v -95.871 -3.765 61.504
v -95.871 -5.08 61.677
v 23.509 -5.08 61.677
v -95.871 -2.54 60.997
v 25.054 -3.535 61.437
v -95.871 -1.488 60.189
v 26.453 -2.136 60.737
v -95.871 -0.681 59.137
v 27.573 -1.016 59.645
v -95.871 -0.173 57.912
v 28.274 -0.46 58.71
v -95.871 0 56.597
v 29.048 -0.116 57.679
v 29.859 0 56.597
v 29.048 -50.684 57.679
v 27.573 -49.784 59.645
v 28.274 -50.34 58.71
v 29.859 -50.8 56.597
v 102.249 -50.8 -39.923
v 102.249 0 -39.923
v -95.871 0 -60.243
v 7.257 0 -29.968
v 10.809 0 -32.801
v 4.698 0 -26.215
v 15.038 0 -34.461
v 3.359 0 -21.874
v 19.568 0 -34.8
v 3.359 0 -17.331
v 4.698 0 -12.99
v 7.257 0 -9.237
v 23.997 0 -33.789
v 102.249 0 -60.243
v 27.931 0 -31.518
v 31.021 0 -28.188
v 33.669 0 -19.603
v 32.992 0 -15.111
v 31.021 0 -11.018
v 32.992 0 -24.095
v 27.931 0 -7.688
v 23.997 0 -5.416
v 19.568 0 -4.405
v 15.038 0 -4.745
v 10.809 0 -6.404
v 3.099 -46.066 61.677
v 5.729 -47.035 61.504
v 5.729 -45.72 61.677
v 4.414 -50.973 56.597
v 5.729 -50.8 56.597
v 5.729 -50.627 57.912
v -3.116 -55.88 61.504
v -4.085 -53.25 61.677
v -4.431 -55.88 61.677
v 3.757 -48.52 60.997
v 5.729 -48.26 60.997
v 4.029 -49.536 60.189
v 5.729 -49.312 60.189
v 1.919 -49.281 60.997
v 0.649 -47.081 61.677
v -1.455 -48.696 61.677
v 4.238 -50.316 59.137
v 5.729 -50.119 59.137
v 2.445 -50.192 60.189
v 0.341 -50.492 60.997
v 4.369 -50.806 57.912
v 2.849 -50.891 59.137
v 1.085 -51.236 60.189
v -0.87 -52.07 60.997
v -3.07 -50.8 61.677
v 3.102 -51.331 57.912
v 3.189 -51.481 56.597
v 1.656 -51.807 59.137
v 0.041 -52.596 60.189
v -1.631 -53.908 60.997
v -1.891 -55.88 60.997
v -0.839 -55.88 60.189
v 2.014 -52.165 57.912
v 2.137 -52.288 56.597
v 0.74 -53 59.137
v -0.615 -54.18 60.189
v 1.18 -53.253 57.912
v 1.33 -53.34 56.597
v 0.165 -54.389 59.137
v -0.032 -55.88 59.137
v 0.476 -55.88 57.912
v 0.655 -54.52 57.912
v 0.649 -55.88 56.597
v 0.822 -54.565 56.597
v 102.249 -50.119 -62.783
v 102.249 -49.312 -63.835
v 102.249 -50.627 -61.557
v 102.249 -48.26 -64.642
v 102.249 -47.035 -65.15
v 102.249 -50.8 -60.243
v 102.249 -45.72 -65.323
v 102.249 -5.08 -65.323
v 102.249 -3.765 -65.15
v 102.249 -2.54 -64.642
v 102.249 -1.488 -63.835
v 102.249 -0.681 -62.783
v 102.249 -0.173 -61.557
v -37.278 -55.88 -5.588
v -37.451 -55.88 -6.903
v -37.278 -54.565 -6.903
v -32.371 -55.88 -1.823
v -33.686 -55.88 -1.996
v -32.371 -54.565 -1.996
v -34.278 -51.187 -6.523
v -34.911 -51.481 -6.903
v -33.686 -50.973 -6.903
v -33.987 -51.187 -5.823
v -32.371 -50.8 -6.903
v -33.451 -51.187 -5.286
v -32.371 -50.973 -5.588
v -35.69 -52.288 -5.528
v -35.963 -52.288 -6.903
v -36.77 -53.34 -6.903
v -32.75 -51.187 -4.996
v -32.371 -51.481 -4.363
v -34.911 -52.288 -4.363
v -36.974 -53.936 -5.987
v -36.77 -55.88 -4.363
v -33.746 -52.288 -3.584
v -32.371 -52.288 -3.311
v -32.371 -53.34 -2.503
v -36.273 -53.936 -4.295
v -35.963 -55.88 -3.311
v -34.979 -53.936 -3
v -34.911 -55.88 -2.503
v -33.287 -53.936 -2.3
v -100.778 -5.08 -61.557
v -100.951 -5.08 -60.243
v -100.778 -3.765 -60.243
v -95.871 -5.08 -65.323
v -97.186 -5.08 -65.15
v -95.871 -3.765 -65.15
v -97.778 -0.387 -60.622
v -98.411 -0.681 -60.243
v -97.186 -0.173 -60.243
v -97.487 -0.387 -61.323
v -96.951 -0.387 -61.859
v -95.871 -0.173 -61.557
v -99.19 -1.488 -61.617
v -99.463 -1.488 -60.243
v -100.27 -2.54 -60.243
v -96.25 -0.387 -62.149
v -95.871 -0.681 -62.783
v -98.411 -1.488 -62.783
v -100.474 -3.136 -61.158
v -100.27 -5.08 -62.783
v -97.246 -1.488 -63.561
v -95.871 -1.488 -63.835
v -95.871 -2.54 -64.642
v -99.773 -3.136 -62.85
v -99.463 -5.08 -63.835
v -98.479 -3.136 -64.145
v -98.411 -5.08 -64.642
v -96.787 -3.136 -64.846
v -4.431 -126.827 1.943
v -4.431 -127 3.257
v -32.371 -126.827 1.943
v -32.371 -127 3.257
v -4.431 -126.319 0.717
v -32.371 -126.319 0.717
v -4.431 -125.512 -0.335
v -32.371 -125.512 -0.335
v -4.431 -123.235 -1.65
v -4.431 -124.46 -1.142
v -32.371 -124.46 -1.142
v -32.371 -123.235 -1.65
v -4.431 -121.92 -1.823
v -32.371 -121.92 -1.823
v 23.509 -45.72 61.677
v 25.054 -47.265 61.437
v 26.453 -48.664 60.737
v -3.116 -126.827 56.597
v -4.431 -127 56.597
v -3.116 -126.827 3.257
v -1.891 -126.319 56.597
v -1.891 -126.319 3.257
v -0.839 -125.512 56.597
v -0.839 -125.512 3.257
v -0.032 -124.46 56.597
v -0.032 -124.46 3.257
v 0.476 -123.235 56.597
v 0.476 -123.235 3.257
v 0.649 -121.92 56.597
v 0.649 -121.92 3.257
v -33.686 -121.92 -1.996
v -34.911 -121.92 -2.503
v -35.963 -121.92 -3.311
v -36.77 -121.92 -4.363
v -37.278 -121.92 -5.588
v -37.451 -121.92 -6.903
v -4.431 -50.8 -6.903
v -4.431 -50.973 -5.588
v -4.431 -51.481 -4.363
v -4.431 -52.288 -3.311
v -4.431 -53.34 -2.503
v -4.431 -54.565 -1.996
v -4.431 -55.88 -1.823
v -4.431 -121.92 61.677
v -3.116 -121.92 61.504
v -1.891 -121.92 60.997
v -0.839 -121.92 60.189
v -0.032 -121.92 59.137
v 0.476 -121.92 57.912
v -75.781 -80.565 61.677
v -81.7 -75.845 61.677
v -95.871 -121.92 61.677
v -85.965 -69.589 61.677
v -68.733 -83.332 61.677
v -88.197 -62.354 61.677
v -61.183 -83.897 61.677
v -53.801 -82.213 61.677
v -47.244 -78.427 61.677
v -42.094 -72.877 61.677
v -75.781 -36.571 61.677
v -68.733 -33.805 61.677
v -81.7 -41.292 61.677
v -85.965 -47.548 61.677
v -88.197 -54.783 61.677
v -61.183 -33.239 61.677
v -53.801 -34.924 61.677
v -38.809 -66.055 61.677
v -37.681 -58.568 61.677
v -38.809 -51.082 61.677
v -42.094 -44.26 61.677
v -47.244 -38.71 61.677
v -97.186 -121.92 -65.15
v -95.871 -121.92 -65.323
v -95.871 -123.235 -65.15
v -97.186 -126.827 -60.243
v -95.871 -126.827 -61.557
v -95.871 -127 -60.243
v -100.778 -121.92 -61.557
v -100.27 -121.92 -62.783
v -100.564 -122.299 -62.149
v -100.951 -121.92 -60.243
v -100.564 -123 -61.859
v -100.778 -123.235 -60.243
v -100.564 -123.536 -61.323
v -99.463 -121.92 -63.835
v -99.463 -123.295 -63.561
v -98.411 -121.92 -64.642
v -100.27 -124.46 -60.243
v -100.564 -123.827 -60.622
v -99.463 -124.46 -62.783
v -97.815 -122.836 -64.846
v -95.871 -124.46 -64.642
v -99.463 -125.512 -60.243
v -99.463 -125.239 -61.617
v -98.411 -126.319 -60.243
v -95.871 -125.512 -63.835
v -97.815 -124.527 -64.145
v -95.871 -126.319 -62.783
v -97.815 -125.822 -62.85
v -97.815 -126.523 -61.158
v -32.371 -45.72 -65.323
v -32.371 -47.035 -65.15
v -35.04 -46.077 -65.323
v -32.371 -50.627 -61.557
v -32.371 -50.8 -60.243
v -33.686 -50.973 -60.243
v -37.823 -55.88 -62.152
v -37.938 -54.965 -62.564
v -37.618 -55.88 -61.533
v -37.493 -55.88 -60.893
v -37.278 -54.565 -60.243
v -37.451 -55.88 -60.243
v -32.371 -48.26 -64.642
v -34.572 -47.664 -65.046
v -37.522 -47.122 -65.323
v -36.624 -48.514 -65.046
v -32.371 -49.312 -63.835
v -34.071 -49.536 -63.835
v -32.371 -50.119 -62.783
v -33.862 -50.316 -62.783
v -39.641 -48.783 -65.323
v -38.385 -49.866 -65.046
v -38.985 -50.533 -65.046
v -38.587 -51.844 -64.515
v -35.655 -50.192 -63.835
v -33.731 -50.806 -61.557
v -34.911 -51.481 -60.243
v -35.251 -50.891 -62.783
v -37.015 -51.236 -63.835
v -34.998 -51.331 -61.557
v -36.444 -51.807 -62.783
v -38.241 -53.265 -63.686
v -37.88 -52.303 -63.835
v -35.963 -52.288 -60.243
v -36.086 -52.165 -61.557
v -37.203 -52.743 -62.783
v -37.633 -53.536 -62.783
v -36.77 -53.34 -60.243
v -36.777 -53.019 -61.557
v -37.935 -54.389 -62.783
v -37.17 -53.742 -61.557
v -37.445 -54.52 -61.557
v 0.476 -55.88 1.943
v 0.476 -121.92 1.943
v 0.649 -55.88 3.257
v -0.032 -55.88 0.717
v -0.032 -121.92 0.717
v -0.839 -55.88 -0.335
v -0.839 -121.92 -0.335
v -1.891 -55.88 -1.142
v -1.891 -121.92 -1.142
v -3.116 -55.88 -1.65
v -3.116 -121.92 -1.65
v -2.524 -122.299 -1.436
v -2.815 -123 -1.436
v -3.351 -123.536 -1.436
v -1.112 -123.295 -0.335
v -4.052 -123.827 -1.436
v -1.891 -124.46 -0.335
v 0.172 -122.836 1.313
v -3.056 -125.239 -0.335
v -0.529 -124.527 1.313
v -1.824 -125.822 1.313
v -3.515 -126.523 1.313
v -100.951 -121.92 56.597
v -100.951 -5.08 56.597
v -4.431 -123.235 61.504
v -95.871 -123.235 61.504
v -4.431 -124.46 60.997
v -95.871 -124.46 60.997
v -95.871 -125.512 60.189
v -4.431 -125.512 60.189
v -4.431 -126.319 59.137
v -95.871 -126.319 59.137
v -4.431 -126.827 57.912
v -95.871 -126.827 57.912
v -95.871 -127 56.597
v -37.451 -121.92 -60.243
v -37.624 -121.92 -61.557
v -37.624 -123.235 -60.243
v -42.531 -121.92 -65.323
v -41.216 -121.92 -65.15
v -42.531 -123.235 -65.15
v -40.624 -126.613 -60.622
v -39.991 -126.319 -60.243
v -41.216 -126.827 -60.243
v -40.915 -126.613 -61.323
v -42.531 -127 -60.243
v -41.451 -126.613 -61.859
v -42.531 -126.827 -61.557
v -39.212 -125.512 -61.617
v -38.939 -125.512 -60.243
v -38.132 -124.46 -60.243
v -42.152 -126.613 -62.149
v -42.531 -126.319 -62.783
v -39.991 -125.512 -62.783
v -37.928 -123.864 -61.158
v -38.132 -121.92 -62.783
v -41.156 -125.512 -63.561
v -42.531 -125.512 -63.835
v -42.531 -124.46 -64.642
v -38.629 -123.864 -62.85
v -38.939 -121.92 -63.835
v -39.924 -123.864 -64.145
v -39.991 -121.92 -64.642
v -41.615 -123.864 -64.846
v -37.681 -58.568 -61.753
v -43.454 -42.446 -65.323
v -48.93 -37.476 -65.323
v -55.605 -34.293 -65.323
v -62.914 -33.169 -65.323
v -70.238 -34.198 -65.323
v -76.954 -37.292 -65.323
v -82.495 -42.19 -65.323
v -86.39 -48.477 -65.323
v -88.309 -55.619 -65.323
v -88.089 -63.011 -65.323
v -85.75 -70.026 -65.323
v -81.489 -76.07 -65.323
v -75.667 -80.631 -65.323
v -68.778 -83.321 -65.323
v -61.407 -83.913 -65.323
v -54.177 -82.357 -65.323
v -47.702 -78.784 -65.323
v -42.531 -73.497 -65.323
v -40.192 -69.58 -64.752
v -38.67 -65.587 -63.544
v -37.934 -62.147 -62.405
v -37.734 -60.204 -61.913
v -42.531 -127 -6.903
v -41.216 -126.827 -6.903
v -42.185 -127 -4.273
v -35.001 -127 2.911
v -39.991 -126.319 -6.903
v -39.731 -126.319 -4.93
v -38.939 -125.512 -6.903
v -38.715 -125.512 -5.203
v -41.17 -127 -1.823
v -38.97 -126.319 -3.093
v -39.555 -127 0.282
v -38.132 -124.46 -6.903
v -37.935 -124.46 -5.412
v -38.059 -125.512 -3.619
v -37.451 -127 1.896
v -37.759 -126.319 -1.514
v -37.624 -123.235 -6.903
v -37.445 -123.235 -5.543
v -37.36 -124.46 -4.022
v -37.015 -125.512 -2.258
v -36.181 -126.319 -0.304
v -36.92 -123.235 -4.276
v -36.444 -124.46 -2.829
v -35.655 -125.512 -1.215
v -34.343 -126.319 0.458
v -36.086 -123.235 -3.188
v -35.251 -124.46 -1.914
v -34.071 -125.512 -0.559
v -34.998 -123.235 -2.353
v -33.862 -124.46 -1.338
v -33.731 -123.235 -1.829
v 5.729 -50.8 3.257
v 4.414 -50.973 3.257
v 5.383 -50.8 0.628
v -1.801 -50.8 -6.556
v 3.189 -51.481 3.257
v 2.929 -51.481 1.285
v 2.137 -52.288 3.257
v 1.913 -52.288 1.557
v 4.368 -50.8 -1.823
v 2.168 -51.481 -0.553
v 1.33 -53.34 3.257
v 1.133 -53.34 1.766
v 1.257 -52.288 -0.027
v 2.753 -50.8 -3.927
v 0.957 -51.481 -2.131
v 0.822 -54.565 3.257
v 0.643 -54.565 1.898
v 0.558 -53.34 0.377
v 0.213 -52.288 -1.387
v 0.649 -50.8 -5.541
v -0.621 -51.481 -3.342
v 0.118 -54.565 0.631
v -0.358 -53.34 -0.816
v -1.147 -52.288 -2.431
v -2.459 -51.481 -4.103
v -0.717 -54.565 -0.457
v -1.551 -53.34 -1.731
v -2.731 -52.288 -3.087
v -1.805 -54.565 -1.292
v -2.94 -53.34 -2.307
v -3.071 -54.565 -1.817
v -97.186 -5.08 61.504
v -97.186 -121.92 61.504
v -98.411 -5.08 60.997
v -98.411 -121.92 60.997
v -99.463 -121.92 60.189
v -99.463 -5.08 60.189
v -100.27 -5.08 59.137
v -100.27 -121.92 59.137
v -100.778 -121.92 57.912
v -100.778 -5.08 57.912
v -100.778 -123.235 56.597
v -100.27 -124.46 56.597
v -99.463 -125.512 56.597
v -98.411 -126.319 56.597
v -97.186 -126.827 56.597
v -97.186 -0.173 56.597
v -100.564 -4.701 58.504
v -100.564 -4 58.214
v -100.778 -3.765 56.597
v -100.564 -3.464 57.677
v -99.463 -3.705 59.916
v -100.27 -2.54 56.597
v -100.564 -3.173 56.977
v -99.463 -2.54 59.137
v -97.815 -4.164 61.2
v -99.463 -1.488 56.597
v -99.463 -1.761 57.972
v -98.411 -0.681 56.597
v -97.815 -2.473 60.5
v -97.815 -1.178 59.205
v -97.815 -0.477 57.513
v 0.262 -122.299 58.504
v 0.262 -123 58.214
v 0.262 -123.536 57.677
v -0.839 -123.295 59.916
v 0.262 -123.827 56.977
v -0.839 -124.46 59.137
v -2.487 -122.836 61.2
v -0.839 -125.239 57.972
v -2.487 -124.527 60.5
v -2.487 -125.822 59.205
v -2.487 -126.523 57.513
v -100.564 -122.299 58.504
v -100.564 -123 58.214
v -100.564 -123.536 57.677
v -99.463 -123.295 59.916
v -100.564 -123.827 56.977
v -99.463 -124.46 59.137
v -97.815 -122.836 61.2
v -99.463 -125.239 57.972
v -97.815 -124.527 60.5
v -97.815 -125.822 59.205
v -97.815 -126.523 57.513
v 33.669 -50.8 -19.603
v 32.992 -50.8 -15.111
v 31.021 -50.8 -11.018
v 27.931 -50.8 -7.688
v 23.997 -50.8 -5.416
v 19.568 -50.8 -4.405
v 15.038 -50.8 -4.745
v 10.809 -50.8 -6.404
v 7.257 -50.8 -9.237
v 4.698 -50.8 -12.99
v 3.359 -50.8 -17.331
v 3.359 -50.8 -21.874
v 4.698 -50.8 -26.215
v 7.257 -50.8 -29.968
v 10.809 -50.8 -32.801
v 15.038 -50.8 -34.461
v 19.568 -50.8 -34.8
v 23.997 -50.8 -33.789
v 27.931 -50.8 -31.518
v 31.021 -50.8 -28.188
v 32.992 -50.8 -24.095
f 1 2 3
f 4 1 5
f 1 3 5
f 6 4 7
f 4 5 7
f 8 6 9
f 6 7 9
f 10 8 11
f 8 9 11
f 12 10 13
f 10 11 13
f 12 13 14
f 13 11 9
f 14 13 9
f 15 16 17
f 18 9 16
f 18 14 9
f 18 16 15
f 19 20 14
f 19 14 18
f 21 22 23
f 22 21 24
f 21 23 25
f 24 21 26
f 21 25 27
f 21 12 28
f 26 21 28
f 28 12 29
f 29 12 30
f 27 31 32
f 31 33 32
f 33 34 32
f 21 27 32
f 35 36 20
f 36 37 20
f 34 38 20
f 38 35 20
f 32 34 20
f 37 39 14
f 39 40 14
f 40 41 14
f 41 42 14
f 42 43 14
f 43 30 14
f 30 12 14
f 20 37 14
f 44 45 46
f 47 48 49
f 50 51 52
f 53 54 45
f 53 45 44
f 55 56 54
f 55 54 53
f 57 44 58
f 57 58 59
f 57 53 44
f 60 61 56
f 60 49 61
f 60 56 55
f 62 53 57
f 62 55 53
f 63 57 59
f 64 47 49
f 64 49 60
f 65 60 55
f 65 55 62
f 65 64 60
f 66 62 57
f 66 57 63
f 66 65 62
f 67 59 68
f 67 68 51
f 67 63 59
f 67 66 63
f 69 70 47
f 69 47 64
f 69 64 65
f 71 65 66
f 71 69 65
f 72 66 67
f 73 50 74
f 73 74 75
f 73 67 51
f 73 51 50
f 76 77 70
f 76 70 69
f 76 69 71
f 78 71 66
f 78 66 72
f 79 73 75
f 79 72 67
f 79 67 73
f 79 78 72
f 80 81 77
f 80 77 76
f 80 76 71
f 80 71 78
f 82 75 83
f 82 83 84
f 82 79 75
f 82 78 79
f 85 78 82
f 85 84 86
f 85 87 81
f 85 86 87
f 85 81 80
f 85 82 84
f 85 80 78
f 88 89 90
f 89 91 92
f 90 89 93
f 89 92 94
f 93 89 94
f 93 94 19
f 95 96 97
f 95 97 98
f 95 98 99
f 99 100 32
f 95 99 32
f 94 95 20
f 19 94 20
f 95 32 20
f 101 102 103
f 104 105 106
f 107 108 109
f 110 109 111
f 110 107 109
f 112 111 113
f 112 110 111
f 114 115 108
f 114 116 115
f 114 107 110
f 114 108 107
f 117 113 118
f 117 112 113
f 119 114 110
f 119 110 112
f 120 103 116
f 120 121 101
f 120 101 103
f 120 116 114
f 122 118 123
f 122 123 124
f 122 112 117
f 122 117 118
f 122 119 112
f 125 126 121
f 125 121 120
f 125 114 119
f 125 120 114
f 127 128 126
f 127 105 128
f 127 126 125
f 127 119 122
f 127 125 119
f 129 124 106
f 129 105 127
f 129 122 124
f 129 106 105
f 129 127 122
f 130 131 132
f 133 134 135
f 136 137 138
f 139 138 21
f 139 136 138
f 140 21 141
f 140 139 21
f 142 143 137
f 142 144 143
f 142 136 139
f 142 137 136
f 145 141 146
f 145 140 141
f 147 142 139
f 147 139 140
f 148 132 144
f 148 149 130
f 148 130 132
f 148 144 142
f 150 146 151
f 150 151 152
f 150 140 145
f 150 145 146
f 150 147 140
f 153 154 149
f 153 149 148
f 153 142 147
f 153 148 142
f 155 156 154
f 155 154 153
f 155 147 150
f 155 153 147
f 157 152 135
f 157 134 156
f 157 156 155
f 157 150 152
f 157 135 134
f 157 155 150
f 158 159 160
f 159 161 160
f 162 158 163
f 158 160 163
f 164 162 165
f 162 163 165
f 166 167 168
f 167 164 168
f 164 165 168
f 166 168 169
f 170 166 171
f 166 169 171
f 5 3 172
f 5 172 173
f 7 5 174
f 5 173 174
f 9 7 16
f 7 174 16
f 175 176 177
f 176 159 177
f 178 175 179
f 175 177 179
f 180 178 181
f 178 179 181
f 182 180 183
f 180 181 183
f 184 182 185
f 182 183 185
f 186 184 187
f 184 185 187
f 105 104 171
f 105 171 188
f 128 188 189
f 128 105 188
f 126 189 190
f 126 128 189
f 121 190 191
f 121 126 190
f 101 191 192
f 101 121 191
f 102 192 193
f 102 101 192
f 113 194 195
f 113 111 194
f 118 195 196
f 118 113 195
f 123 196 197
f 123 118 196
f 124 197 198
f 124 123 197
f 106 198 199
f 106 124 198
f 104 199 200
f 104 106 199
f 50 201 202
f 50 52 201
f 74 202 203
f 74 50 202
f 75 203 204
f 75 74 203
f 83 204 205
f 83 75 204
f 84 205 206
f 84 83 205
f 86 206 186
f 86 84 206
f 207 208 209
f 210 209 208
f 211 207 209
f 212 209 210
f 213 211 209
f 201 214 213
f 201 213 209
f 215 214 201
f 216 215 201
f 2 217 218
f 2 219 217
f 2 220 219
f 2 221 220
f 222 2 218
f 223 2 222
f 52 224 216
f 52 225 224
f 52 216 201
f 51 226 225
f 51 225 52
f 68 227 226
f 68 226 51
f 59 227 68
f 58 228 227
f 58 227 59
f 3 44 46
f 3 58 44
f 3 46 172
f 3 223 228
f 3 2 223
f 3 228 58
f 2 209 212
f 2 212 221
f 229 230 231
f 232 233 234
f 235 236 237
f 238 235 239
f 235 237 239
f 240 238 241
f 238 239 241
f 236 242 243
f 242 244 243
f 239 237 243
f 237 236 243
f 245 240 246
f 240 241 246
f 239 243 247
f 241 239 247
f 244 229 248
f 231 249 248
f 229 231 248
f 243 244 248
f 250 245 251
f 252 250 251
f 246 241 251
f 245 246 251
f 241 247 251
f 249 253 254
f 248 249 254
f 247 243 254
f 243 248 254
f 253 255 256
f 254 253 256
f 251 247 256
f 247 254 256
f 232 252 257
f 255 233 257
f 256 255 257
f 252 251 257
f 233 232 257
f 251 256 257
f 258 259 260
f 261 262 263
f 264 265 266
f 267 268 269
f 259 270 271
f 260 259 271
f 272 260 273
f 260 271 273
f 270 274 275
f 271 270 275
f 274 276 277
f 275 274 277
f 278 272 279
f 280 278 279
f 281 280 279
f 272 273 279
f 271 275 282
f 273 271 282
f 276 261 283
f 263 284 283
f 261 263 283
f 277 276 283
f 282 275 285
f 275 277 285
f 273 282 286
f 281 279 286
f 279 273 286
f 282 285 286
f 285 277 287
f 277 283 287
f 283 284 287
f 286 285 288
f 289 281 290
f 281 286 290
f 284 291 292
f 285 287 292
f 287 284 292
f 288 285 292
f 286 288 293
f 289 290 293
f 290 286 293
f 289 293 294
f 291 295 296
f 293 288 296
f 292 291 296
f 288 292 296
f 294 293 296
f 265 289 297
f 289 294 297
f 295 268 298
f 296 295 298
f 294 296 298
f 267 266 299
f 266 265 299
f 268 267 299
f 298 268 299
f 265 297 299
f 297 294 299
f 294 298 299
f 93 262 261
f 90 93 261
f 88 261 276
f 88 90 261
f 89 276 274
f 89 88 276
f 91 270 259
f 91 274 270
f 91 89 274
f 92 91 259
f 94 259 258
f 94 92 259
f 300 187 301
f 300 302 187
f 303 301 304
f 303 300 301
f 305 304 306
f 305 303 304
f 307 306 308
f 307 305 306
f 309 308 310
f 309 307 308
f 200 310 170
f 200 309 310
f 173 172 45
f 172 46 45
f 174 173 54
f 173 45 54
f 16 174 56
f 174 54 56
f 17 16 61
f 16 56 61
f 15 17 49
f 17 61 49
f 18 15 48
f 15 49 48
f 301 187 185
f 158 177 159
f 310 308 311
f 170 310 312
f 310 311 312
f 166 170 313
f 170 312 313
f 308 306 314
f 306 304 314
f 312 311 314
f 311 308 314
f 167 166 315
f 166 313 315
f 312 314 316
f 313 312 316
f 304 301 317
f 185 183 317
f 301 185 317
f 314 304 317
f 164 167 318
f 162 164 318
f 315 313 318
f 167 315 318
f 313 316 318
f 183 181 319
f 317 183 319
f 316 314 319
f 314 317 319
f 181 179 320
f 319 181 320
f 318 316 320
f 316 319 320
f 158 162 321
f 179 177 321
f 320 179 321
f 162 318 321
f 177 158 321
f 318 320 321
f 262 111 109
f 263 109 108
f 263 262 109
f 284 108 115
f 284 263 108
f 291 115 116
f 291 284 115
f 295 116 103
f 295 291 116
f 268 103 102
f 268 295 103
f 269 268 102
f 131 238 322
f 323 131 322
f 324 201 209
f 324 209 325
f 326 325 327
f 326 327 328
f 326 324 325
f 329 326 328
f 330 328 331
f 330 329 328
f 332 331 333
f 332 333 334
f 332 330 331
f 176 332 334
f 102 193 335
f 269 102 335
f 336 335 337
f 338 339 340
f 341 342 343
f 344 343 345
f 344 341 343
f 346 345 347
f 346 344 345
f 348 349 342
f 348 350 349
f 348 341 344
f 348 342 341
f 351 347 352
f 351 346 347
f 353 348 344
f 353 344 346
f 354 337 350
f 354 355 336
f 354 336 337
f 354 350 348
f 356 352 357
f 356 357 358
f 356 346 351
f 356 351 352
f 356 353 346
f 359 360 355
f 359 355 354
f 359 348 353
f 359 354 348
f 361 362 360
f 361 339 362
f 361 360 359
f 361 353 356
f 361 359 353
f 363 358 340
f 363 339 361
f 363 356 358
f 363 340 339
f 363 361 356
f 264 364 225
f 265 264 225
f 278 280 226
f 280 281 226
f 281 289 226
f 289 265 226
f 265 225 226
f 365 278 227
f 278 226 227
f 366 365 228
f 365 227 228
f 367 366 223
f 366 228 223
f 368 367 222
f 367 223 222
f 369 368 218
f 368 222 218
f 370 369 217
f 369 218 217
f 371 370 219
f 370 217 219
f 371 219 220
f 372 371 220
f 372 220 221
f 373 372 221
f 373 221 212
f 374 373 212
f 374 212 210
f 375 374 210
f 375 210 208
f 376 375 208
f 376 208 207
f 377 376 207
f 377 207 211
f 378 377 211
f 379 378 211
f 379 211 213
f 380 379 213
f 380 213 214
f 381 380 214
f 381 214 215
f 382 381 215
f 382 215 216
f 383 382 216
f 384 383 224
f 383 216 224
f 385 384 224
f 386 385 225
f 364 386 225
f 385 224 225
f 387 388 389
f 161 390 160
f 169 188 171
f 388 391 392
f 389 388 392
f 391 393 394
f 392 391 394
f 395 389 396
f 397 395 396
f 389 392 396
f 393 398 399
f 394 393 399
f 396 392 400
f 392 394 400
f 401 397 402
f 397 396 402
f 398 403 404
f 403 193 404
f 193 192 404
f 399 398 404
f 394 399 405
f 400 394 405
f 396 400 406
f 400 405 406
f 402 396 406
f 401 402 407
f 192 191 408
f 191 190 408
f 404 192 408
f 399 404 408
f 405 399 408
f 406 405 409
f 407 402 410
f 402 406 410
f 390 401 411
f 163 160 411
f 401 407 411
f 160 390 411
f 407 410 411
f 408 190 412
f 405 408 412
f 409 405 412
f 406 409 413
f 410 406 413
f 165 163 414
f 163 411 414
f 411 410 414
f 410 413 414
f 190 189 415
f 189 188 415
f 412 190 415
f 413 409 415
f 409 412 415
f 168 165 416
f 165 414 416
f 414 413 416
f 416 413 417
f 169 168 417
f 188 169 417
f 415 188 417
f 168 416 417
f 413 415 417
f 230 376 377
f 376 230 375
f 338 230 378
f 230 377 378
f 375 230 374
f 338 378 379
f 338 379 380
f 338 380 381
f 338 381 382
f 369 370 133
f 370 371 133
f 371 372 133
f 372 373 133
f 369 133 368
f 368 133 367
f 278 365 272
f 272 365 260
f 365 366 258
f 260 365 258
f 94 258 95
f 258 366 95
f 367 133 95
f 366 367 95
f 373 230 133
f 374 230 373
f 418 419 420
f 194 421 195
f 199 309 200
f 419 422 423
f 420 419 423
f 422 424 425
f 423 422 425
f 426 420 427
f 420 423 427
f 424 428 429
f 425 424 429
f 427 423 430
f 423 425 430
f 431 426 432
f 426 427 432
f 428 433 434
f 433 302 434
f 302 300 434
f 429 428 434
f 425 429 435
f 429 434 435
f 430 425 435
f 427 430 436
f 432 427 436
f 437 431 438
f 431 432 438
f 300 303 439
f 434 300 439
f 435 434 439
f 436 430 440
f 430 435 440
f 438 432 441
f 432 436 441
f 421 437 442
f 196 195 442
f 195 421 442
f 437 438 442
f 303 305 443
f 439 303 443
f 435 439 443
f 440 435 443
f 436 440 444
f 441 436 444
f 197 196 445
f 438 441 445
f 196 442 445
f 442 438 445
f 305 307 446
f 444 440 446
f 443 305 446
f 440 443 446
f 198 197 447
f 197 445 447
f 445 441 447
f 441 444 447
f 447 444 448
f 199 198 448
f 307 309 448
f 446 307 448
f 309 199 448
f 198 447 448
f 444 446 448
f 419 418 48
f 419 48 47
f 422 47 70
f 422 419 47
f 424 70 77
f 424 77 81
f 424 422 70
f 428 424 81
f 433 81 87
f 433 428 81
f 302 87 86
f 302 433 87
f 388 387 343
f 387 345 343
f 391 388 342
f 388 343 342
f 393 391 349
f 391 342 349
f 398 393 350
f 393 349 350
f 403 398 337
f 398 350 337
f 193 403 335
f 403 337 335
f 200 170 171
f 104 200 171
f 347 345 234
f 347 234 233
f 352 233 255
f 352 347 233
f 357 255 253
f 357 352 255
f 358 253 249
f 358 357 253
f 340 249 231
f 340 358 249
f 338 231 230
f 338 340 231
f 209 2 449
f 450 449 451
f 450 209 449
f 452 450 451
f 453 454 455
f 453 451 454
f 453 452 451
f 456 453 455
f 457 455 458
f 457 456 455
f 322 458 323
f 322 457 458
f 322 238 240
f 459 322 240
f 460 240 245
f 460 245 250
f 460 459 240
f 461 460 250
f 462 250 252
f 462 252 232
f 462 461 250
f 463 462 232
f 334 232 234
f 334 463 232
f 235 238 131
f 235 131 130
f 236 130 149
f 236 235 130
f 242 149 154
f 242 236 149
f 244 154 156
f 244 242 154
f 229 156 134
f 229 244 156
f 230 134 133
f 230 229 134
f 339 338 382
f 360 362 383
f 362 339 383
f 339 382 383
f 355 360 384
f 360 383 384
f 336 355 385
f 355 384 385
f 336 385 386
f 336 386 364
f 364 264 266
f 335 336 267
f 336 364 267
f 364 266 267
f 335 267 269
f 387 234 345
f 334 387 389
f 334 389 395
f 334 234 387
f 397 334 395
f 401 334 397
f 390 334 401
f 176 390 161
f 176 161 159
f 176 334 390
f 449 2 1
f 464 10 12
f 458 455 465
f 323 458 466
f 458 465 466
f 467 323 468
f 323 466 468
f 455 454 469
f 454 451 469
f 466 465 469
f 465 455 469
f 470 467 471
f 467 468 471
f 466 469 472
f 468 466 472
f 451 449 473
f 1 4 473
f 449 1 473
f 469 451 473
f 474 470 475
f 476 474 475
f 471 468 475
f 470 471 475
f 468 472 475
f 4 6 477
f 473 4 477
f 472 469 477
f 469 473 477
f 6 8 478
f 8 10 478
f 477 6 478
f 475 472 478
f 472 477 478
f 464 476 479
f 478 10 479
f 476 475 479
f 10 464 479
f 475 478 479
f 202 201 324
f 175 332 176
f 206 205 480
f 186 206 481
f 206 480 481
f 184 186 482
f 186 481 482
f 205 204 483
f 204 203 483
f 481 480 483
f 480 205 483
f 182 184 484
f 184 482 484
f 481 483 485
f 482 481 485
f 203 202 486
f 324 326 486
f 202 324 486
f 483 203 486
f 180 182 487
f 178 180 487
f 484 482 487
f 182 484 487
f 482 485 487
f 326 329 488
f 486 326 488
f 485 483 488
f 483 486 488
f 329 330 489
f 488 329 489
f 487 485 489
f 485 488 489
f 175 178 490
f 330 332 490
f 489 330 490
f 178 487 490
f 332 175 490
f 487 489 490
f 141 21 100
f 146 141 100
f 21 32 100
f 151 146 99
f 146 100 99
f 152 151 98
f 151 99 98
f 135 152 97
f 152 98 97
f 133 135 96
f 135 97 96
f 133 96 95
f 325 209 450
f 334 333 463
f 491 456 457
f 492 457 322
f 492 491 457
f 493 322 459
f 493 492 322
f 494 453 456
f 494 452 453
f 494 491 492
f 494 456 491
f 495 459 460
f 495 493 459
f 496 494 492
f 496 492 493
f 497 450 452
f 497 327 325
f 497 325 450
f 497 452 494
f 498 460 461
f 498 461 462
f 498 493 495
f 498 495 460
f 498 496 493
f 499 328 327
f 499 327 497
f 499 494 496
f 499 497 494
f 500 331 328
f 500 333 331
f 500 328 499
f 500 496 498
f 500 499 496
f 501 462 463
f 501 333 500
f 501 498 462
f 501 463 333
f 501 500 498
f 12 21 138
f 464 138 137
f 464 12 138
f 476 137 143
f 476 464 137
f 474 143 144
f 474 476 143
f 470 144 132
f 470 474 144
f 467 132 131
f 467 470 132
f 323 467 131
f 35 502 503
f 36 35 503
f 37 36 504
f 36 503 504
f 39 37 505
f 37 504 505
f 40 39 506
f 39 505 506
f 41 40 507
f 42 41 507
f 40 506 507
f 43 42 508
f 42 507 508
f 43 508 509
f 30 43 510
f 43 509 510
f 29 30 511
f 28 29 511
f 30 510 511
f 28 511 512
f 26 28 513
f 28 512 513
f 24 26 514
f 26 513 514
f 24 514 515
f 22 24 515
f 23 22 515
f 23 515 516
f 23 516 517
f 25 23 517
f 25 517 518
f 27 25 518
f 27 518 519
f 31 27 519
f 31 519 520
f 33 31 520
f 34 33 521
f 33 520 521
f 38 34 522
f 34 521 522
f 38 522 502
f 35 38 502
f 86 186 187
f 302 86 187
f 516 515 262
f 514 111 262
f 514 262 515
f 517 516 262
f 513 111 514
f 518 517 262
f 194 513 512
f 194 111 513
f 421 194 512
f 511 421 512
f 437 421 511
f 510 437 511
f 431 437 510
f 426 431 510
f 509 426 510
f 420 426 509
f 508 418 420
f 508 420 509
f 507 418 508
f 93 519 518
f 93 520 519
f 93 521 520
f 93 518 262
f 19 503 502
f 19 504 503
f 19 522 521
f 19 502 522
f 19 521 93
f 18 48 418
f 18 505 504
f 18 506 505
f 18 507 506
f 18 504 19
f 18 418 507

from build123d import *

# Parameters (mm, degrees)
F0_W     = 203.2
F0_H     = 127
F1_DEPTH = 127
F3_DEPTH = 76.2
F4_SIZE2 = 101.6
F4_SIZE  = 76.2
F5_R     = 5.08
F6_R     = 15.24
F7_DEPTH = 50.8
F8_R     = 25.4
F9_DEPTH = 127


with BuildPart() as f1:
    # F0 (on Front) → F1 (new body)
    with BuildSketch(Plane.XZ):
        with Locations((0.6489251732, -1.8226355314)):
            Rectangle(F0_W, F0_H)
    extrude(amount=F1_DEPTH)

    # F2 (on face) → F3 (cut)
    with BuildSketch(Plane.XZ.offset(127)):
        Polygon((102.2489251732, 61.6773644686), (0.6489251732, 61.6773644686), (0.6489251732, -1.8226355314), (-37.4510748268, -1.8226355314), (-37.4510748268, -65.3226355314), (102.2489251732, -65.3226355314), align=None)
    extrude(amount=-F3_DEPTH, mode=Mode.SUBTRACT)

    # F4
    f4_edges = [f1.edges().sort_by_distance(p)[0] for p in [
        (102.248925, -25.4, 61.677364),
    ]]
    f4_side = f1.faces().sort_by_distance((-21.122503, -52.614286, 61.677364))[0]
    chamfer(f4_edges, length=F4_SIZE, length2=F4_SIZE2, reference=f4_side)

    # F5
    f5_edges = [f1.edges().sort_by_distance(p)[0] for p in [
        (-50.151075, -127, 61.677364),
        (-37.451075, 0, 61.677364),
        (26.048925, -25.4, 61.677364),
        (-100.951075, -63.5, 61.677364),
        (13.348925, -50.8, 61.677364),
        (0.648925, -88.9, 61.677364),
        (0.648925, -127, 29.927364),
        (0.648925, -88.9, -1.822636),
        (0.648925, -50.8, 29.927364),
        (-37.451075, -88.9, -1.822636),
        (-37.451075, -88.9, -65.322636),
        (-37.451075, -127, -33.572636),
        (-37.451075, -50.8, -33.572636),
        (-69.201075, -127, -65.322636),
        (-100.951075, -63.5, -65.322636),
        (-100.951075, 0, -1.822636),
        (-100.951075, -127, -1.822636),
        (0.648925, 0, -65.322636),
        (32.398925, -50.8, -65.322636),
        (-18.401075, -50.8, -1.822636),
        (-18.401075, -127, -1.822636),
    ]]
    fillet(f5_edges, radius=F5_R)

    # F6 (on face) → F7 (cut, through all)
    with BuildSketch(Plane.XZ.offset(50.8)):
        with Locations((18.4289251732, -19.6026355314)):
            Circle(F6_R)
    extrude(amount=-F7_DEPTH, mode=Mode.SUBTRACT)

    # F8 (on face) → F9 (cut, through all)
    with BuildSketch(Plane.XY.offset(61.6773644686)):
        with Locations((-63.0807951093, -58.5683807731)):
            Circle(F8_R)
    extrude(amount=-F9_DEPTH, mode=Mode.SUBTRACT)


solid = f1.part
